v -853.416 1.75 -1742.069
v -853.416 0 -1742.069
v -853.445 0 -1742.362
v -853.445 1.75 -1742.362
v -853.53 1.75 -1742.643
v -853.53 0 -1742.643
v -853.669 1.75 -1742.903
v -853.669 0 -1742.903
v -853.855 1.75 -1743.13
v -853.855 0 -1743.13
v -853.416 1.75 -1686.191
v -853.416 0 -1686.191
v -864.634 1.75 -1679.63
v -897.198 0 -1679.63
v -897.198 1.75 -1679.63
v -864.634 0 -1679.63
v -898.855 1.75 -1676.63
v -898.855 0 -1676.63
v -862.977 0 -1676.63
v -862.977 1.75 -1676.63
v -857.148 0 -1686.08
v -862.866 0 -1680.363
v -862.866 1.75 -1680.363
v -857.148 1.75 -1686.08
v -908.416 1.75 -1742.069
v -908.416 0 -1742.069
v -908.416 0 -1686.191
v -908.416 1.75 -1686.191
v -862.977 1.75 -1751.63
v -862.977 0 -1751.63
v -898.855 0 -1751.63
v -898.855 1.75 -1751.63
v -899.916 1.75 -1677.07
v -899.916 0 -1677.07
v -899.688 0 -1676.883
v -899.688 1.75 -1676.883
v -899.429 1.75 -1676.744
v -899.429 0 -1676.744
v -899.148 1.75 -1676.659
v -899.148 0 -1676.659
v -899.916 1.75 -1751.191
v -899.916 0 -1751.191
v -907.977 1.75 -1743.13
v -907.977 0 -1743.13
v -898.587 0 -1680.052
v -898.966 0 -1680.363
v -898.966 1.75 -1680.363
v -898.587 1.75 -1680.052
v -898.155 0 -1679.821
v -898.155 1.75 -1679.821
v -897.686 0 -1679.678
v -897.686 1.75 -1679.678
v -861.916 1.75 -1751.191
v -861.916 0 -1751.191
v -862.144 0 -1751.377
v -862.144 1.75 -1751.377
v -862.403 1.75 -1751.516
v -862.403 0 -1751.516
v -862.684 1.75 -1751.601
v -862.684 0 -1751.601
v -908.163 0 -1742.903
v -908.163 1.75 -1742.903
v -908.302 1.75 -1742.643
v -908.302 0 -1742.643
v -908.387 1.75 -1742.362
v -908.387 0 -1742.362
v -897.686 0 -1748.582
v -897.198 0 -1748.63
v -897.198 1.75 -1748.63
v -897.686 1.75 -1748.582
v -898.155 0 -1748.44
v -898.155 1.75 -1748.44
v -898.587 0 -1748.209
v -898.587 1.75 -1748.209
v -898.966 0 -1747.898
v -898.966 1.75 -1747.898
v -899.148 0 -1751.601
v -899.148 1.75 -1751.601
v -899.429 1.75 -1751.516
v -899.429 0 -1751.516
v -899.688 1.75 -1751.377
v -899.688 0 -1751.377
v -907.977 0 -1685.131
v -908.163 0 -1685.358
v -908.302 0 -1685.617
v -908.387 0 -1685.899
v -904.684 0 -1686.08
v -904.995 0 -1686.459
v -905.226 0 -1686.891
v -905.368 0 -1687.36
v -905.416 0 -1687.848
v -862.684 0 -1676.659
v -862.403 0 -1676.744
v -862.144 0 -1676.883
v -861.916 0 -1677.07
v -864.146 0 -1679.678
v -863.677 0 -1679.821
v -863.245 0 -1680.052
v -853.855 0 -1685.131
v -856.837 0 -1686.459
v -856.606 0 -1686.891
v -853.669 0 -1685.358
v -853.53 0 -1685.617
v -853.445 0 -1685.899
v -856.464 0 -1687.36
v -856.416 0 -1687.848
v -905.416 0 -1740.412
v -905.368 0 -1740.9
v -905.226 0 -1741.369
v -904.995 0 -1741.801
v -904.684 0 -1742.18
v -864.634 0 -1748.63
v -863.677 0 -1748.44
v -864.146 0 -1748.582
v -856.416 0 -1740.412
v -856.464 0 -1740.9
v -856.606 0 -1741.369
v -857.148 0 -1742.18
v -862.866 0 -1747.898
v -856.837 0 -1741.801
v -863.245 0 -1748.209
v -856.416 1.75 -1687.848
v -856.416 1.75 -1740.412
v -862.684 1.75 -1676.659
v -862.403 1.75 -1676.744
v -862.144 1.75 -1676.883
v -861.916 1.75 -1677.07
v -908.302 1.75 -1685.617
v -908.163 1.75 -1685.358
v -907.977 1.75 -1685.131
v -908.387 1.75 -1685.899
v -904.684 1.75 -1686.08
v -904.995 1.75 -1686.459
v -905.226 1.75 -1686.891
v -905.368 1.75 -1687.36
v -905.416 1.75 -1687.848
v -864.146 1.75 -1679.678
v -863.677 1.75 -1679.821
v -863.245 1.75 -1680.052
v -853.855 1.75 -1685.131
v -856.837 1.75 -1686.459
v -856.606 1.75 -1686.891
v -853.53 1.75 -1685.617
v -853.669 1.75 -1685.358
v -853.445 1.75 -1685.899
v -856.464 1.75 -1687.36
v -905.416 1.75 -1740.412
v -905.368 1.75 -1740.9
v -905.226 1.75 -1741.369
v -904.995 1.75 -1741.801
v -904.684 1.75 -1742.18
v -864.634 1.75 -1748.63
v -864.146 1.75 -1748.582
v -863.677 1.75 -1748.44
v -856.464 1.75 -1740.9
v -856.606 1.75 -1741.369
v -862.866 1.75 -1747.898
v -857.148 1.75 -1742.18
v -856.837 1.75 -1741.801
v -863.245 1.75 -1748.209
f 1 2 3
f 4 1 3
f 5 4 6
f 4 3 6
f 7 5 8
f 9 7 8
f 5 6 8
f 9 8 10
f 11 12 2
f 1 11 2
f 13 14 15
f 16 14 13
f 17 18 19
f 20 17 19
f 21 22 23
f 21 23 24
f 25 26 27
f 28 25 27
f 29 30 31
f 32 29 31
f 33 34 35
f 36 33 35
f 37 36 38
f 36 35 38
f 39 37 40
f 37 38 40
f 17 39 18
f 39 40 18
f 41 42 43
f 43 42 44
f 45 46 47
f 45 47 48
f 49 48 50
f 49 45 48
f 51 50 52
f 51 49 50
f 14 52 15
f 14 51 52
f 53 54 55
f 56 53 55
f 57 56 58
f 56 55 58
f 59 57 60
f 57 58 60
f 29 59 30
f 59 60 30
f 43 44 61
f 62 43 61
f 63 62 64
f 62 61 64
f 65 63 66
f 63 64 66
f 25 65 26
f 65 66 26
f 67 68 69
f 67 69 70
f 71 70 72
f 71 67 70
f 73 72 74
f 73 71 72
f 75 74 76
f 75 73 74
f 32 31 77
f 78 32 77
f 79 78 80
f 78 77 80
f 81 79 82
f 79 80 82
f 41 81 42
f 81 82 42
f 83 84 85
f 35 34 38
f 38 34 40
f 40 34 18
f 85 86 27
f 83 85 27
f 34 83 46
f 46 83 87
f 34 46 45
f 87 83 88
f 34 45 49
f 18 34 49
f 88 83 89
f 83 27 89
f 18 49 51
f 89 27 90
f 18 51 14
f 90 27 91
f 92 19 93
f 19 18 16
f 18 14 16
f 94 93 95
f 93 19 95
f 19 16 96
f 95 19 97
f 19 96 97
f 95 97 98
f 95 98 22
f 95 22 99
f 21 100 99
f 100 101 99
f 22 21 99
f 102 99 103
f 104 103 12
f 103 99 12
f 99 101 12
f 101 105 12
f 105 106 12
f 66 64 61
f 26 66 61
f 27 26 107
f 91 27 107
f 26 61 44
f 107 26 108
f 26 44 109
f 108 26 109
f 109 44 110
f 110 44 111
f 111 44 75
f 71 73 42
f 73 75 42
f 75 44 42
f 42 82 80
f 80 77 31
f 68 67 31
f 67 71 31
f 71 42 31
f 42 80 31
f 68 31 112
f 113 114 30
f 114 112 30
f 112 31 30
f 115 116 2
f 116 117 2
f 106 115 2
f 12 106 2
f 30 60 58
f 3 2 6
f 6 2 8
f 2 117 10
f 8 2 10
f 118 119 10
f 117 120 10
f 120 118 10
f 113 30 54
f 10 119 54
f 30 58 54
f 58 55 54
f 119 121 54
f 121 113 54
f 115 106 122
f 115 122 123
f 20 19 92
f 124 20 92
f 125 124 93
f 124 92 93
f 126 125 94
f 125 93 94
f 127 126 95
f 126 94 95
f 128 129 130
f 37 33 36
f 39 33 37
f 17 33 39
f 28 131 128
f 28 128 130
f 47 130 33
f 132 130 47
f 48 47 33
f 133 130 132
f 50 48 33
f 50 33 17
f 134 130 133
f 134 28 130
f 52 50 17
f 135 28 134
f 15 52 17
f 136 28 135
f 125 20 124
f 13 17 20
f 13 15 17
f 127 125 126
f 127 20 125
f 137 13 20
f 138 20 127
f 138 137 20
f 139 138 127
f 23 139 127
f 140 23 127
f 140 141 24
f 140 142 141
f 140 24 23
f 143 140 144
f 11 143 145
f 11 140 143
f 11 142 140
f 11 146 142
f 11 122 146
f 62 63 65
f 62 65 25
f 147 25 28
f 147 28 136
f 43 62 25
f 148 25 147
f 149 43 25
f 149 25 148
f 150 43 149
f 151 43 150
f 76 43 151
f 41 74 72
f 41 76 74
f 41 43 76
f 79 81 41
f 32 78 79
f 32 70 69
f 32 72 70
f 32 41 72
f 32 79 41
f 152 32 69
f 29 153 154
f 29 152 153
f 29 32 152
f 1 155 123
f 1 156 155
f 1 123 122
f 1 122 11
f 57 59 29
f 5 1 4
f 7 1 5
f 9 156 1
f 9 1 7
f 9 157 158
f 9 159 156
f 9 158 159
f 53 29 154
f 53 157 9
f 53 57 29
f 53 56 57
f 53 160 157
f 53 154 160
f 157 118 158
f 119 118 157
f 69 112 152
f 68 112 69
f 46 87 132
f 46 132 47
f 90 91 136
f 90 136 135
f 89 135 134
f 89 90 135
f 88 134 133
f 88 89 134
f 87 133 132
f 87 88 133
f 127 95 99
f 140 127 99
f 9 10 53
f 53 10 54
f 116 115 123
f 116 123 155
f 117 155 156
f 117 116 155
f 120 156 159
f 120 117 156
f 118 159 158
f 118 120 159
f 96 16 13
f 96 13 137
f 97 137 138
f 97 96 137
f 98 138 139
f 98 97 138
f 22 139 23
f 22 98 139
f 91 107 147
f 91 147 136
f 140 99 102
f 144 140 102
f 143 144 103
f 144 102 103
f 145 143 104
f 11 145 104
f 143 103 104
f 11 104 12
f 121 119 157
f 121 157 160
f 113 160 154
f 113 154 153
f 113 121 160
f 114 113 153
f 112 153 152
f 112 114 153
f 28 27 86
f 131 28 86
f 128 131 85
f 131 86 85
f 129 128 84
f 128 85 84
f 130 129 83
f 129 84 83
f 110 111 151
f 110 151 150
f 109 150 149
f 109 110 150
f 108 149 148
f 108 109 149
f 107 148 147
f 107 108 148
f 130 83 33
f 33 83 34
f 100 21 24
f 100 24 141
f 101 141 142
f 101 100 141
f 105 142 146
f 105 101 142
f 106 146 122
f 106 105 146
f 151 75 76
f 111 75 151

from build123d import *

# Parameters (mm, degrees)
BOSS_EXTRUDE1_DEPTH = 1.75


with BuildPart() as part:
    # Sketch1 → Boss-Extrude1 (new body)
    with BuildSketch(Plane(origin=(-905.783657891, 0, -1752.480725949), x_dir=(1, 0, 0), z_dir=(0, 1, 0))):
        with BuildLine():
            Line((5.86809467, -1.289791394), (-2.192922636, -9.3508087))
            ThreePointArc((-2.192922636, -9.3508087), (-2.518081763, -9.837443723), (-2.632262464, -10.411468871))
            Line((-2.632262464, -10.411468871), (-2.632262464, -66.28943426))
            ThreePointArc((-2.632262464, -66.28943426), (-2.518081763, -66.863459408), (-2.192922636, -67.350094431))
            Line((-2.192922636, -67.350094431), (5.86809467, -75.411111737))
            ThreePointArc((5.86809467, -75.411111737), (6.354729693, -75.736270864), (6.928754842, -75.850451566))
            Line((6.928754842, -75.850451566), (42.80672023, -75.850451566))
            ThreePointArc((42.80672023, -75.850451566), (43.380745379, -75.736270864), (43.867380402, -75.411111737))
            Line((43.867380402, -75.411111737), (51.928397708, -67.350094431))
            ThreePointArc((51.928397708, -67.350094431), (52.253556835, -66.863459408), (52.367737536, -66.28943426))
            Line((52.367737536, -66.28943426), (52.367737536, -10.411468871))
            ThreePointArc((52.367737536, -10.411468871), (52.253556835, -9.837443723), (51.928397708, -9.3508087))
            Line((51.928397708, -9.3508087), (43.867380402, -1.289791394))
            ThreePointArc((43.867380402, -1.289791394), (43.380745379, -0.964632267), (42.80672023, -0.850451566))
            Line((42.80672023, -0.850451566), (6.928754842, -0.850451566))
            ThreePointArc((6.928754842, -0.850451566), (6.354729693, -0.964632267), (5.86809467, -1.289791394))
        make_face()
        with BuildLine():
            Line((6.817842138, -4.582684613), (1.099970583, -10.300556168))
            ThreePointArc((1.099970583, -10.300556168), (0.558038705, -11.11161454), (0.367737536, -12.068323121))
            Line((0.367737536, -12.068323121), (0.367737536, -64.63258001))
            ThreePointArc((0.367737536, -64.63258001), (0.558038705, -65.589288591), (1.099970583, -66.400346963))
            Line((1.099970583, -66.400346963), (6.817842138, -72.118218519))
            ThreePointArc((6.817842138, -72.118218519), (7.62890051, -72.660150397), (8.585609091, -72.850451566))
            Line((8.585609091, -72.850451566), (41.149865981, -72.850451566))
            ThreePointArc((41.149865981, -72.850451566), (42.106574562, -72.660150397), (42.917632934, -72.118218519))
            Line((42.917632934, -72.118218519), (48.635504489, -66.400346963))
            ThreePointArc((48.635504489, -66.400346963), (49.177436367, -65.589288591), (49.367737536, -64.63258001))
            Line((49.367737536, -64.63258001), (49.367737536, -12.068323121))
            ThreePointArc((49.367737536, -12.068323121), (49.177436367, -11.11161454), (48.635504489, -10.300556168))
            Line((48.635504489, -10.300556168), (42.917632934, -4.582684613))
            ThreePointArc((42.917632934, -4.582684613), (42.106574562, -4.040752734), (41.149865981, -3.850451566))
            Line((41.149865981, -3.850451566), (8.585609091, -3.850451566))
            ThreePointArc((8.585609091, -3.850451566), (7.62890051, -4.040752734), (6.817842138, -4.582684613))
        make_face(mode=Mode.SUBTRACT)
    extrude(amount=BOSS_EXTRUDE1_DEPTH)


solid = part.part
